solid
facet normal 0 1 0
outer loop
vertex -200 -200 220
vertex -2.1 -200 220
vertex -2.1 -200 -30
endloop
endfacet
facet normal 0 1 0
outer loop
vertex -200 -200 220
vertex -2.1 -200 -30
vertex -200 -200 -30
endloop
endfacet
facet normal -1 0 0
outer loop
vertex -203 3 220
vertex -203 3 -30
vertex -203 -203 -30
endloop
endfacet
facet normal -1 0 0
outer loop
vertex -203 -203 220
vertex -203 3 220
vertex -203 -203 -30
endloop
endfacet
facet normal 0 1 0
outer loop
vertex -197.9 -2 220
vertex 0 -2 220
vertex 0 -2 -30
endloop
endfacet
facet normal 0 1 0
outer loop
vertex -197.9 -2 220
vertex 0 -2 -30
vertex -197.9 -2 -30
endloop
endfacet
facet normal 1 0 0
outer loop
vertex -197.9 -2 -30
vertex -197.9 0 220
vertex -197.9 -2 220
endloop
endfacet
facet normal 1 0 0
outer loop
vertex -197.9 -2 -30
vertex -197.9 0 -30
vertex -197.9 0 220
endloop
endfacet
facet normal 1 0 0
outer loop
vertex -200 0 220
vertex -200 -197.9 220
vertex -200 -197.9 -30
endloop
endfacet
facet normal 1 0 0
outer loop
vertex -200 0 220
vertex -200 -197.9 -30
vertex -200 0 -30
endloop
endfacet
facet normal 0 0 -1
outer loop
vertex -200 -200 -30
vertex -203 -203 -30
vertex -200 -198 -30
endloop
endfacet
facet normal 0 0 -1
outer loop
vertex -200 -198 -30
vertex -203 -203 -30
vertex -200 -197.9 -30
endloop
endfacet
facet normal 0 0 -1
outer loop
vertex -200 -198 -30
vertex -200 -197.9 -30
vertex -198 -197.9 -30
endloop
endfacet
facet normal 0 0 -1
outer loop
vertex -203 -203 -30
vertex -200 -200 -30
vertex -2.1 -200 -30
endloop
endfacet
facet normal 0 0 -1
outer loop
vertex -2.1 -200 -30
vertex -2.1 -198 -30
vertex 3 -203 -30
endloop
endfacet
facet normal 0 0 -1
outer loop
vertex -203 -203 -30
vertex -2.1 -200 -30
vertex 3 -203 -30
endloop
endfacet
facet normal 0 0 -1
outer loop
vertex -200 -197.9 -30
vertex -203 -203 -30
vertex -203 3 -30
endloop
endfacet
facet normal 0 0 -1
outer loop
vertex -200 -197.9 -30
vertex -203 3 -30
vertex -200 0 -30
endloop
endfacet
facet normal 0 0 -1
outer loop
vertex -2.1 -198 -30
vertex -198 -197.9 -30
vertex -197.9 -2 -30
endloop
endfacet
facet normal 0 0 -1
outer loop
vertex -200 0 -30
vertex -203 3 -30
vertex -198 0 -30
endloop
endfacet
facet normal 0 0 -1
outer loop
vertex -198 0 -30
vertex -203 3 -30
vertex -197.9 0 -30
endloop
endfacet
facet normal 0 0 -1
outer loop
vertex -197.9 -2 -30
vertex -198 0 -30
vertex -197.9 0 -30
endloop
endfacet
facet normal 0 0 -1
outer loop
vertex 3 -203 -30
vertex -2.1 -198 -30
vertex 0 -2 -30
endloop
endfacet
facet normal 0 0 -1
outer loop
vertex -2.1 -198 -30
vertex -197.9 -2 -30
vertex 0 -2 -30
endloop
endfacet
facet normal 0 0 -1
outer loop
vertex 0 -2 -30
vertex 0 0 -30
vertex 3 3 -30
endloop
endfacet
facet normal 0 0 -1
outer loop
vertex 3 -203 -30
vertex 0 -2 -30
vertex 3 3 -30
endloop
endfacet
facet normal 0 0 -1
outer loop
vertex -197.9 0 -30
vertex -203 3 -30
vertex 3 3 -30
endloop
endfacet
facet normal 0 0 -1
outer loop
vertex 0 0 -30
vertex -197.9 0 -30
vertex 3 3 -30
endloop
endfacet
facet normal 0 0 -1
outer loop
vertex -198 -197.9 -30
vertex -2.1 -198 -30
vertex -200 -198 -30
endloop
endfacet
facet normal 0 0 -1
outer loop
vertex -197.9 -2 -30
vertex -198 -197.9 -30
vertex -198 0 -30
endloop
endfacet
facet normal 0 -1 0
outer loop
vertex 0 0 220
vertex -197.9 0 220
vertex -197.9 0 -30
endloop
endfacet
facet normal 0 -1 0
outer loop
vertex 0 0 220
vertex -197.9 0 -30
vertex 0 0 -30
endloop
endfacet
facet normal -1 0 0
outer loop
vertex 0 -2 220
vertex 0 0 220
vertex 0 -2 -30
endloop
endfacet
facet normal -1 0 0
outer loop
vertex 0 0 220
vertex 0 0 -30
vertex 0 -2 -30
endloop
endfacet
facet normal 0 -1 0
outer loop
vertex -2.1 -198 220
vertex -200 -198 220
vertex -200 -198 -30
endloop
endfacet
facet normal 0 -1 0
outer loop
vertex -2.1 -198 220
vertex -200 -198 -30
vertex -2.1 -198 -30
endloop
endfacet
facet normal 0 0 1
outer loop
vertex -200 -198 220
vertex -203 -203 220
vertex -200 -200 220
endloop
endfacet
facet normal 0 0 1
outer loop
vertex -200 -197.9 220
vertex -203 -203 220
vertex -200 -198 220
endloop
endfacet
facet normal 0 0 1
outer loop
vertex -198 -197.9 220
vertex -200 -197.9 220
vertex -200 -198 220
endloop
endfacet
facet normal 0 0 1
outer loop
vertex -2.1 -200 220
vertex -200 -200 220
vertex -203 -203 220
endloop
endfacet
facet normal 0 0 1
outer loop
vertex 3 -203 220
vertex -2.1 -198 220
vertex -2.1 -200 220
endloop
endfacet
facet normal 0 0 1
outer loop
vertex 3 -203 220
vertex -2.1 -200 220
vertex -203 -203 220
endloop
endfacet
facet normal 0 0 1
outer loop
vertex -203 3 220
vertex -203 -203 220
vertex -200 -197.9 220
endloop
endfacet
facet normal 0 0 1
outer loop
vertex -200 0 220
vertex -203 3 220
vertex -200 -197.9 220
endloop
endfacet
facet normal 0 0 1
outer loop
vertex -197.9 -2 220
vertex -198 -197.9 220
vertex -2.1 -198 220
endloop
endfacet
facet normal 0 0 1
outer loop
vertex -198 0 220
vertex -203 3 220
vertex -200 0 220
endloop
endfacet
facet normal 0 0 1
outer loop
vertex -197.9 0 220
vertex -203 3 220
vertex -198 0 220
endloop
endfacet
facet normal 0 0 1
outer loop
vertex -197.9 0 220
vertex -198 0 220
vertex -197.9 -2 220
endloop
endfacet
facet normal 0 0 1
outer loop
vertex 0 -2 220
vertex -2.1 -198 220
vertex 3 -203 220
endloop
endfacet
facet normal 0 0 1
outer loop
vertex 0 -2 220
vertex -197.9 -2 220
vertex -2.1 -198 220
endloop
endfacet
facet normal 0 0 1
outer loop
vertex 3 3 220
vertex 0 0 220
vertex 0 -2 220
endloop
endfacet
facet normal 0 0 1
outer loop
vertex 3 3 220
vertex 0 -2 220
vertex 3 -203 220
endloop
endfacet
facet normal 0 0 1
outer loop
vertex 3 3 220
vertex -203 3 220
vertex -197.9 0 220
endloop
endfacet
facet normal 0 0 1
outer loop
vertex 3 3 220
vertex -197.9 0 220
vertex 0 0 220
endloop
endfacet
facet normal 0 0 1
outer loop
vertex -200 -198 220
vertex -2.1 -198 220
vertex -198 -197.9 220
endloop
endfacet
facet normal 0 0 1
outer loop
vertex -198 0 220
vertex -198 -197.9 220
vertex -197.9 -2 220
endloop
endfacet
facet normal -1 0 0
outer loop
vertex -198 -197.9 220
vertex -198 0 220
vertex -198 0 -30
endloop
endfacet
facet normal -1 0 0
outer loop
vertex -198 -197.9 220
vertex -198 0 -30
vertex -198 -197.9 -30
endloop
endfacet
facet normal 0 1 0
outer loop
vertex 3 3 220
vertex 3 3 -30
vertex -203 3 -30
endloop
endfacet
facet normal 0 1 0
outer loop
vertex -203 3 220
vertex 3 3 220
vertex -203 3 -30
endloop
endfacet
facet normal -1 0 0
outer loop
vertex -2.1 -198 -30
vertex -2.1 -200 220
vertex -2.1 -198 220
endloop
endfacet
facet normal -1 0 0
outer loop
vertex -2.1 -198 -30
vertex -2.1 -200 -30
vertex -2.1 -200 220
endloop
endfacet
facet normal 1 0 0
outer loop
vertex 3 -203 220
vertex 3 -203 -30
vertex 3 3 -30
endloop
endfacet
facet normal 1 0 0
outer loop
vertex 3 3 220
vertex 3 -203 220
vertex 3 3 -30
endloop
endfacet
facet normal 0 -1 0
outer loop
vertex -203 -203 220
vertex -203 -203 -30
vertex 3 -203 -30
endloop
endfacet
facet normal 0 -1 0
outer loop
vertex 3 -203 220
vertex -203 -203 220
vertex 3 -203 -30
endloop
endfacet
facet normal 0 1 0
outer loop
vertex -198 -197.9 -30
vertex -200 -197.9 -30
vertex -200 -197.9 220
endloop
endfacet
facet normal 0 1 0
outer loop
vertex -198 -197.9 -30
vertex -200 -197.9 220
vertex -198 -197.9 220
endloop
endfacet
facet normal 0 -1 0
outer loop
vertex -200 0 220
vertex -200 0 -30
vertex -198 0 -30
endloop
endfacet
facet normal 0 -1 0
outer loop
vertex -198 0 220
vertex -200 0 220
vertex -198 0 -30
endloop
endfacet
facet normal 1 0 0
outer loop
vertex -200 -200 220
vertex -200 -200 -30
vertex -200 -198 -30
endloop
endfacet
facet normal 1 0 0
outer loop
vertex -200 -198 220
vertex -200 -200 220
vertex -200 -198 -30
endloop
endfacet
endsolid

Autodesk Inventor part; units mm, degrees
ref_plane "YZ Plane" through (0, 0, 0) normal (1, 0, 0) x (0, 1, 0)
ref_plane "XZ Plane" through (0, 0, 0) normal (0, 1, 0) x (-1, 0, 0)
ref_plane "XY Plane" through (0, 0, 0) normal (0, 0, 1) x (1, 0, 0)
sketch "Boceto1" plane through (0, 0, 0) normal (0, 0, 1) x (1, 0, 0)
  line L0 (-200, -197.9) -> (-200, 0) projected
  line L1 (-198, 0) -> (-198, -197.9) projected
  line L2 (-200, 0) -> (-198, 0) projected
  line L3 (-197.9, 0) -> (0, 0) projected
  line L4 (0, -2) -> (-197.9, -2) projected
  line L5 (0, 0) -> (0, -2) projected
  line L6 (0, -2.1) -> (0, -200) projected
  line L7 (-2, -200) -> (-2, -2.1) projected
  line L8 (0, -200) -> (-2, -200) projected
  line L9 (-2.1, -200) -> (-200, -200) projected
  line L10 (-200, -198) -> (-2.1, -198) projected
  line L11 (-200, -200) -> (-200, -198) projected
  line L12 (-200, -200) -> (0, -200)
  line L13 (0, -200) -> (0, 0)
  line L14 (0, 0) -> (-200, 0)
  line L15 (-200, 0) -> (-200, -200)
  line L16 (0, 0) -> (0, 3)
  line L17 (0, 3) -> (3, 3)
  line L18 (-200, -200) -> (-203, -200)
  line L19 (-203, -200) -> (-203, -203)
  line L20 (-203, -203) -> (3, -203)
  line L21 (3, -203) -> (3, 3)
  line L22 (3, 3) -> (-203, 3)
  line L23 (-203, 3) -> (-203, -203)
  line L24 (-200, -197.9) -> (-198, -197.9) projected
  line L25 (-197.9, 0) -> (-197.9, -2) projected
  line L26 (0, -2.1) -> (-2, -2.1) projected
  line L27 (-2.1, -200) -> (-2.1, -198) projected
  point P0 (-198, -198)
  point P1 (-198, -2)
  point P2 (-2, -2)
  point P3 (-2, -198)
  dimension "espesor" = 3
  dimension "d1" = 3
  dimension "d2" = 3
  dimension "d3" = 3
extrude "Extrusión1" add sketch "Boceto1" along normal blind 220 and the other way blind 30 contours L15 L11 L18 L23 L22 L16 L3 L14 L2 L0 | L24 L1 L14 L25 L4 L13 L26 L7 L12 L27 L10 L15 | L9 L12 L8 L6 L13 L5 L16 L17 L21 L20 L19 L18 | L7 L26 L6 L8
equation "\"d1\" = espesor"
equation "\"d2\" = espesor"
equation "\"d3\" = espesor"
properties part number "Envolvente"
